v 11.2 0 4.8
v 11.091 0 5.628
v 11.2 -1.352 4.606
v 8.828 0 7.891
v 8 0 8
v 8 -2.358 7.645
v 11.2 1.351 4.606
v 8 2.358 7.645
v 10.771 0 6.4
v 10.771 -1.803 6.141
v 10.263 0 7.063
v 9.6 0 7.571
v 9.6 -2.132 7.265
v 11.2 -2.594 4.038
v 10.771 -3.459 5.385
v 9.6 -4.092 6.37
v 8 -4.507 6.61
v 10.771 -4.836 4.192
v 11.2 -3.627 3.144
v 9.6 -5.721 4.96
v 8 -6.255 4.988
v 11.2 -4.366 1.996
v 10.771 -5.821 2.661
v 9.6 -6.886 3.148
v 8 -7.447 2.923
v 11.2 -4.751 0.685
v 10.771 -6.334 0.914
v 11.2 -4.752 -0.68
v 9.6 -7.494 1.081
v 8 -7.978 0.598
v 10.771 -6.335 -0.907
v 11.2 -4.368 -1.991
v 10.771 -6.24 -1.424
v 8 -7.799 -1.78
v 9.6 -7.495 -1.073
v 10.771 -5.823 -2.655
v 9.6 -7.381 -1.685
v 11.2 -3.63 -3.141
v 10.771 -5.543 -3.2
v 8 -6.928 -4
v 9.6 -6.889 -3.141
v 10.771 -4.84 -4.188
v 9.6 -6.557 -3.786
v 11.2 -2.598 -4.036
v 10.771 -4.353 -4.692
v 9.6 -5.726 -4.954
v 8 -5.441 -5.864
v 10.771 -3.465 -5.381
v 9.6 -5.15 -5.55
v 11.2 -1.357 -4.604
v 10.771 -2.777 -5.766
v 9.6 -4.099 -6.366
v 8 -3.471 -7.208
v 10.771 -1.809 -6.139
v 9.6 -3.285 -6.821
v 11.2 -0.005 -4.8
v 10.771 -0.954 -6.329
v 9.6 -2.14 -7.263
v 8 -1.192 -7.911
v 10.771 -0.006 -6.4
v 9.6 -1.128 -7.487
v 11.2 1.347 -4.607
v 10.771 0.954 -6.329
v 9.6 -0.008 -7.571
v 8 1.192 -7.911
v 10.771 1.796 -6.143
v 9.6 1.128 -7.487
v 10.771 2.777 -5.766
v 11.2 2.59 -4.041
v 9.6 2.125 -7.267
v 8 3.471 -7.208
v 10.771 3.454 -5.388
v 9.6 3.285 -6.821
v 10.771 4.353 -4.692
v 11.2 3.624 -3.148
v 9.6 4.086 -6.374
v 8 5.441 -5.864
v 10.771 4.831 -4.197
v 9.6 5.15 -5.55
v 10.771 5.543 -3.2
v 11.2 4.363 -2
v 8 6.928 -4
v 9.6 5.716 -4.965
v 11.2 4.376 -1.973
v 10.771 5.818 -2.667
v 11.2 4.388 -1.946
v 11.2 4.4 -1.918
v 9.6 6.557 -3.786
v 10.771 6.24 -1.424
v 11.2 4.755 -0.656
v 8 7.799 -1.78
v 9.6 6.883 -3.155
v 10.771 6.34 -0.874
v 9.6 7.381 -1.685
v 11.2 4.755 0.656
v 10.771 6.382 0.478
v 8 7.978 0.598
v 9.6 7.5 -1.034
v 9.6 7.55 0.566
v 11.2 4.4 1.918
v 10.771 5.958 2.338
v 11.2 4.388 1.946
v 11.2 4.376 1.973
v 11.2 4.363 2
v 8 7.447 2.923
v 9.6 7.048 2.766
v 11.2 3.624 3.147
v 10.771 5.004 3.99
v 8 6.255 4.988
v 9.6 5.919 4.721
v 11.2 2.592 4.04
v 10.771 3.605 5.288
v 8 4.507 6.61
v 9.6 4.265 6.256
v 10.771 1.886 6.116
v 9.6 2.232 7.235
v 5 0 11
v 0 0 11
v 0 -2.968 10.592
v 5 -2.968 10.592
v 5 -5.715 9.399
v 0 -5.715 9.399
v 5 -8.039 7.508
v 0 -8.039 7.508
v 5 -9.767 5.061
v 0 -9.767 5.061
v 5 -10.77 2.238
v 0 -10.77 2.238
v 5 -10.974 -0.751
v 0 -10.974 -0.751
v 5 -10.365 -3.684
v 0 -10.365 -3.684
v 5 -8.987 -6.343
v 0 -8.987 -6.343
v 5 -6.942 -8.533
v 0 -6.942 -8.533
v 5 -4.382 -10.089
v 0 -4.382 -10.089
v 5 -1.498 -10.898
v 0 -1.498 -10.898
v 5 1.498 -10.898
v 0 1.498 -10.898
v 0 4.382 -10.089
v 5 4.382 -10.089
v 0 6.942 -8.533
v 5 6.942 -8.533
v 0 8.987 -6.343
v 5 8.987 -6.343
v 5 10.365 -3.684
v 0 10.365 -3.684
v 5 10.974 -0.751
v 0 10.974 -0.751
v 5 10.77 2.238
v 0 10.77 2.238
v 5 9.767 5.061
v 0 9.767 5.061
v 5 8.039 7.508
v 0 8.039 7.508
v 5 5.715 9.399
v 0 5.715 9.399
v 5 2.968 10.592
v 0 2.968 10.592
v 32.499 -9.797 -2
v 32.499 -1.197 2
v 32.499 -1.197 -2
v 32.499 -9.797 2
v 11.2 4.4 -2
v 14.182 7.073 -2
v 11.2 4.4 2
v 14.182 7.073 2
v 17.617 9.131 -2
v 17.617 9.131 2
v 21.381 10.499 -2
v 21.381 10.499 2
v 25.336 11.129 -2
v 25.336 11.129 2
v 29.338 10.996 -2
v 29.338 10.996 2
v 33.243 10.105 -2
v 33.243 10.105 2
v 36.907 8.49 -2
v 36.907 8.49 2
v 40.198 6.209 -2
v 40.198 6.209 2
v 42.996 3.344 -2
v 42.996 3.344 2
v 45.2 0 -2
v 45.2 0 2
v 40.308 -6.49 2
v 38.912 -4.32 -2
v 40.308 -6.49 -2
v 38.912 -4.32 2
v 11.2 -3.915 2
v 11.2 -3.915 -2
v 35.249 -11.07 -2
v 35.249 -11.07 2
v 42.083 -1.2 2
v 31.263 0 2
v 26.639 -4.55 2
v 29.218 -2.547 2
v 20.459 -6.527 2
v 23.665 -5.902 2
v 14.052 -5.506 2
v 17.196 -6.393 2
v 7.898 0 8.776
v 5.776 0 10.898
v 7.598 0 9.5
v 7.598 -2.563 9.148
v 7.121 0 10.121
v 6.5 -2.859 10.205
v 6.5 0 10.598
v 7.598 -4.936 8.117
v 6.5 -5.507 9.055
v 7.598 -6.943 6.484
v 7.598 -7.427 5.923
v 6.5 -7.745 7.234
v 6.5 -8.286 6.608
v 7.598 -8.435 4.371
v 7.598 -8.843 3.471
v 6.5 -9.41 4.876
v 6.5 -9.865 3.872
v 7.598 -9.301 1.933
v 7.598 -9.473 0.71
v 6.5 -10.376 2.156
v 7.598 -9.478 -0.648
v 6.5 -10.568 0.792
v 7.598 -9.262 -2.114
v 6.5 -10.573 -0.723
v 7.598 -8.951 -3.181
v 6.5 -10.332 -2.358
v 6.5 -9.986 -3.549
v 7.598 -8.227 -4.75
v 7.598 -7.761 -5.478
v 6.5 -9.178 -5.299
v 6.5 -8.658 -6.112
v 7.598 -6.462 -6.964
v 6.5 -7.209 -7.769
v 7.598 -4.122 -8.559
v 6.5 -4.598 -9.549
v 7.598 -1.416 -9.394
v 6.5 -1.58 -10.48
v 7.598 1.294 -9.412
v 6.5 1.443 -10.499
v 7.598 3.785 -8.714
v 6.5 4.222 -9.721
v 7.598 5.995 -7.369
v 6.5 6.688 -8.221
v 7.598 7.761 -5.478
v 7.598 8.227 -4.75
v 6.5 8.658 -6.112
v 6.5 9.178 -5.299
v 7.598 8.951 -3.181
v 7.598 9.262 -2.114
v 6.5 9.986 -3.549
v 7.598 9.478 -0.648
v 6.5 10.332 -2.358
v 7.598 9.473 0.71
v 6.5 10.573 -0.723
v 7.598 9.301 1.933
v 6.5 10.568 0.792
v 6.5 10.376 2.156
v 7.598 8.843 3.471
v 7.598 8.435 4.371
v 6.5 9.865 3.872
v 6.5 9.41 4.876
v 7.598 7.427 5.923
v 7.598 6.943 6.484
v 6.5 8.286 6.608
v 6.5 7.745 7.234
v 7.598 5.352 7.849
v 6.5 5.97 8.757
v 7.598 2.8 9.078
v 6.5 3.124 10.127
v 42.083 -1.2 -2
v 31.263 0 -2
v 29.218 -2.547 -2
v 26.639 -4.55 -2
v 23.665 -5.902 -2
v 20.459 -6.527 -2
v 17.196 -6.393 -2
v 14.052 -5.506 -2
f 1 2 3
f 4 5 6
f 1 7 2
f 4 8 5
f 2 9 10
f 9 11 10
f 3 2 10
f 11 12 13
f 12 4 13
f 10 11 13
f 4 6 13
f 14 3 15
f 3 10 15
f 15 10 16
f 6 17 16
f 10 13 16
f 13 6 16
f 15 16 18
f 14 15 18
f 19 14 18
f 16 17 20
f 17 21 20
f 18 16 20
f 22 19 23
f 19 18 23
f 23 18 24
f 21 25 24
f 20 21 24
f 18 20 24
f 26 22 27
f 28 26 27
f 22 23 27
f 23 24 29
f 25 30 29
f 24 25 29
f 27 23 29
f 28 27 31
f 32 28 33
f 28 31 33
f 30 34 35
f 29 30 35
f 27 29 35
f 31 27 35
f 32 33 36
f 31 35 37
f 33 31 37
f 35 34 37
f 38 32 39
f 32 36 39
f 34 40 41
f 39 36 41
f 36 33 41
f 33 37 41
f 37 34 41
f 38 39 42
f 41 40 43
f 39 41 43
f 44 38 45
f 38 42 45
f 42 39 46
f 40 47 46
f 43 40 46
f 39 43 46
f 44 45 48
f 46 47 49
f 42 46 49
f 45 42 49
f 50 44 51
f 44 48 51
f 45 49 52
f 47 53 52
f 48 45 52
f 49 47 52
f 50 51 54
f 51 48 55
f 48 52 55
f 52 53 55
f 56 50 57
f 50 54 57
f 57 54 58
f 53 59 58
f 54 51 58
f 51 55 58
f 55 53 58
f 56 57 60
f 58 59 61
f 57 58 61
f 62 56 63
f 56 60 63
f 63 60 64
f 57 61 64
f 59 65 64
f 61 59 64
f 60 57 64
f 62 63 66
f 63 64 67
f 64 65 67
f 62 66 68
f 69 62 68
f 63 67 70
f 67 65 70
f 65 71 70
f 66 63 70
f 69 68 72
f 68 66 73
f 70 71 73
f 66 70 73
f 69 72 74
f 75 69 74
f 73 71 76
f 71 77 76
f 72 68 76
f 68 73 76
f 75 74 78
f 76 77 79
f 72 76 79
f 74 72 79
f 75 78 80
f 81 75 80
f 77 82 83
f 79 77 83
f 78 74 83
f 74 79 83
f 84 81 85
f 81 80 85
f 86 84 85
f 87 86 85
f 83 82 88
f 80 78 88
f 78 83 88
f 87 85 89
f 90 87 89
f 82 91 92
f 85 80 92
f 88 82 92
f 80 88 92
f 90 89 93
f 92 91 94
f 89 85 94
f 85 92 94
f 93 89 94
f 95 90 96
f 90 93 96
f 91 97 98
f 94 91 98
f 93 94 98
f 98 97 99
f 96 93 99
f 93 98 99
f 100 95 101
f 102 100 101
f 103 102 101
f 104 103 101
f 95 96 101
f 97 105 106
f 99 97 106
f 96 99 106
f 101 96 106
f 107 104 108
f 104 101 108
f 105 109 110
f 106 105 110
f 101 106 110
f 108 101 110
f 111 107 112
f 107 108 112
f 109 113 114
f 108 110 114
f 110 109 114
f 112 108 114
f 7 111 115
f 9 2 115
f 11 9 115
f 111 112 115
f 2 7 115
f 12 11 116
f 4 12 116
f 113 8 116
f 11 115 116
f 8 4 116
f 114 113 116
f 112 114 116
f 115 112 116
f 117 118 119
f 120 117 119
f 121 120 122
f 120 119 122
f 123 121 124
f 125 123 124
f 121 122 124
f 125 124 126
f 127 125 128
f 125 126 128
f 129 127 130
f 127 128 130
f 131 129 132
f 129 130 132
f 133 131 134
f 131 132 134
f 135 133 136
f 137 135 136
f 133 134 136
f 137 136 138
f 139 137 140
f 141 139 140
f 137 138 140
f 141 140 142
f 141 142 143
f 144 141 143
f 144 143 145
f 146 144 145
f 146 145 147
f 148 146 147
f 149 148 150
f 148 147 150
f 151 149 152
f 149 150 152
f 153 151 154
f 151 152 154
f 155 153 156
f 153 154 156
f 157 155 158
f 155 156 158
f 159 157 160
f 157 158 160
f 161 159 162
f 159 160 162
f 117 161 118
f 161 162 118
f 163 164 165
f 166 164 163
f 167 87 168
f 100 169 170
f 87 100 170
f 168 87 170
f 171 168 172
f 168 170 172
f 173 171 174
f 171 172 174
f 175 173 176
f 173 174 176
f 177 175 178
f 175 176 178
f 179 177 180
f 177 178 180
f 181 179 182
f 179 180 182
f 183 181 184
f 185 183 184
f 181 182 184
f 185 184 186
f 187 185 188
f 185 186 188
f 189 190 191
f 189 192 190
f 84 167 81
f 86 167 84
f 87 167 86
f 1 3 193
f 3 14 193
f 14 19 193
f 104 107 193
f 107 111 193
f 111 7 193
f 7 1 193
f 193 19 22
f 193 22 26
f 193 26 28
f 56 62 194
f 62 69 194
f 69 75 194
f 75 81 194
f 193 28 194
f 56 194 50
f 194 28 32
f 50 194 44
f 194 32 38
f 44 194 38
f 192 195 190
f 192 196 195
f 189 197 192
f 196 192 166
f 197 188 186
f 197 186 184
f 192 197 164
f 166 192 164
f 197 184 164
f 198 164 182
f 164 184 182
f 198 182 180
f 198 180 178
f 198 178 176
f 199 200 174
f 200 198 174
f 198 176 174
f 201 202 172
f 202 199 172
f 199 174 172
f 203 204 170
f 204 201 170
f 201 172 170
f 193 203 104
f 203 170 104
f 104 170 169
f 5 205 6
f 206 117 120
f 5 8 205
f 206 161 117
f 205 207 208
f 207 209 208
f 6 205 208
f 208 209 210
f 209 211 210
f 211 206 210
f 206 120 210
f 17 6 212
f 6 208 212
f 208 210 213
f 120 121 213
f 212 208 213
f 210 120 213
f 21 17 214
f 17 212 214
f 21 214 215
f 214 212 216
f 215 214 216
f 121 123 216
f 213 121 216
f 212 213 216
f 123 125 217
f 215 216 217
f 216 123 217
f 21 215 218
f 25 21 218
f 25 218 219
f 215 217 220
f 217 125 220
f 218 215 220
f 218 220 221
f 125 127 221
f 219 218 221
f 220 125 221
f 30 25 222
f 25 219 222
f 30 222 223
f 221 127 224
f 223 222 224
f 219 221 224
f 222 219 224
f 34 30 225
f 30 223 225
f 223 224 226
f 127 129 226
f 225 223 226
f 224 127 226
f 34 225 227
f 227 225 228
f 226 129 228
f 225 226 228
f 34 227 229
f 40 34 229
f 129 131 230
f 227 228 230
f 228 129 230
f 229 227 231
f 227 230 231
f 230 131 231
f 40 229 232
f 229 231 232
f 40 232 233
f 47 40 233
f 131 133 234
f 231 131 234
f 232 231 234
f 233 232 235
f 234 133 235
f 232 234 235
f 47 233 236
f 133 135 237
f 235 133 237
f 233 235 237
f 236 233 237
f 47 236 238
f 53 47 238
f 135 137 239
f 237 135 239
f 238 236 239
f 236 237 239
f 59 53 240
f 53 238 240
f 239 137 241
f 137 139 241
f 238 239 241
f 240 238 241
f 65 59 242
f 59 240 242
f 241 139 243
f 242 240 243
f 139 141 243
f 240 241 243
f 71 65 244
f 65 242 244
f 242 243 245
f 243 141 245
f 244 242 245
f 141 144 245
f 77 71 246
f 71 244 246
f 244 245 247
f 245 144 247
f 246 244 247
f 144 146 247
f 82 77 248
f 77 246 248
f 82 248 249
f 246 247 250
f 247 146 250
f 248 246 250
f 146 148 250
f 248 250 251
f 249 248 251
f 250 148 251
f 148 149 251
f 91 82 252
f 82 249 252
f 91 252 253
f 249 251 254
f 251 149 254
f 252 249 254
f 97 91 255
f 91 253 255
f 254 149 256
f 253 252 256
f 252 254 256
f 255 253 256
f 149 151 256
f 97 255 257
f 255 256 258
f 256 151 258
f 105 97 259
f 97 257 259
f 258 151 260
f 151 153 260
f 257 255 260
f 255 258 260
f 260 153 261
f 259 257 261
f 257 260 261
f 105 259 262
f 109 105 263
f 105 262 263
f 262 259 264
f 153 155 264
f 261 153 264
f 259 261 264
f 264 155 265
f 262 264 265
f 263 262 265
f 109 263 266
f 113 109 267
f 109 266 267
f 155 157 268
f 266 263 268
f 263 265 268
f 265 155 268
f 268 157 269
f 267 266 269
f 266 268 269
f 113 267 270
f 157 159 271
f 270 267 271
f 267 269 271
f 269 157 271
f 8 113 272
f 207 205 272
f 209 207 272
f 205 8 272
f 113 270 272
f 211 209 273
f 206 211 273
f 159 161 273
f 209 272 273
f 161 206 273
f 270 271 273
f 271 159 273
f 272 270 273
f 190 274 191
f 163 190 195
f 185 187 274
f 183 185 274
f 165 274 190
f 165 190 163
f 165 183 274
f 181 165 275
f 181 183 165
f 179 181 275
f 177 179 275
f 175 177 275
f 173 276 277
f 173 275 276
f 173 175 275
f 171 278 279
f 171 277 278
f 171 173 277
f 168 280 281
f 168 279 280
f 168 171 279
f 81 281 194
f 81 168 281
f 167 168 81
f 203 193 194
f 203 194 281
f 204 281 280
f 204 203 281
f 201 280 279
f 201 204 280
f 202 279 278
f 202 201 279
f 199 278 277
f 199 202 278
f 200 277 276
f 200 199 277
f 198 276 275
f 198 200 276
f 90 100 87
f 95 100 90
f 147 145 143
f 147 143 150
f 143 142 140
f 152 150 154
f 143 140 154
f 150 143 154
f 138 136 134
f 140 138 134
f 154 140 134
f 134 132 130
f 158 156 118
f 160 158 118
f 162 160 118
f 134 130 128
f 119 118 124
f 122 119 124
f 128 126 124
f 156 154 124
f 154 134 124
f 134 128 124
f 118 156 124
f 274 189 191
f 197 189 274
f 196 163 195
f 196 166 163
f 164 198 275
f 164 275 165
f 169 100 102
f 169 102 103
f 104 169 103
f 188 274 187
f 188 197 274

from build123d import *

# Parameters (mm, degrees)
EXTRUDE_2643_DEPTH = 2


with BuildPart() as part:
    # Sketch 219 → Повернуть1 (revolve)
    with BuildSketch(Plane.XY):
        with BuildLine():
            Line((0, 11), (0, 0))
            Line((0, 0), (11.2, 0))
            Line((11.2, 0), (11.2, 4.8))
            ThreePointArc((11.2, 4.8), (10.2627417, 7.0627417), (8, 8))
            ThreePointArc((8, 8), (7.121320344, 10.121320344), (5, 11))
            Line((5, 11), (0, 11))
        make_face()
    revolve(axis=Axis((0, 0, 0), (1, 0, 0)))

    # Sketch 1503 → Extrude 2643 (add, symmetric)
    with BuildSketch(Plane.XY):
        with BuildLine():
            Line((11.2, 4.4), (11.2, -3.914978255))
            ThreePointArc((11.2, -3.914978255), (22.080678837, -6.30816882), (31.263463773, 0))
            Line((31.263463773, 0), (32.498964702, -1.197255299))
            Line((32.498964702, -1.197255299), (32.498964702, -9.797255299))
            Line((32.498964702, -9.797255299), (35.248695767, -11.07))
            Line((35.248695767, -11.07), (38.912013935, -4.32))
            Line((38.912013935, -4.32), (40.307542508, -6.49))
            Line((40.307542508, -6.49), (42.083014277, -1.2))
            Line((42.083014277, -1.2), (45.2, 0))
            ThreePointArc((45.2, 0), (29.338267199, 10.995701086), (11.2, 4.4))
        make_face()
    extrude(amount=EXTRUDE_2643_DEPTH, both=True)

    # попа<16> → Повернуть2 (revolve)
    with BuildSketch(Plane.XY):
        with BuildLine():
            ThreePointArc((8, 8), (7.121320344, 10.121320344), (5, 11))
            Line((5, 11), (5, 0))
            Line((5, 0), (8, 0))
            Line((8, 0), (8, 8))
        make_face()
    revolve(axis=Axis((0, 0, 0), (1, 0, 0)))


solid = part.part
